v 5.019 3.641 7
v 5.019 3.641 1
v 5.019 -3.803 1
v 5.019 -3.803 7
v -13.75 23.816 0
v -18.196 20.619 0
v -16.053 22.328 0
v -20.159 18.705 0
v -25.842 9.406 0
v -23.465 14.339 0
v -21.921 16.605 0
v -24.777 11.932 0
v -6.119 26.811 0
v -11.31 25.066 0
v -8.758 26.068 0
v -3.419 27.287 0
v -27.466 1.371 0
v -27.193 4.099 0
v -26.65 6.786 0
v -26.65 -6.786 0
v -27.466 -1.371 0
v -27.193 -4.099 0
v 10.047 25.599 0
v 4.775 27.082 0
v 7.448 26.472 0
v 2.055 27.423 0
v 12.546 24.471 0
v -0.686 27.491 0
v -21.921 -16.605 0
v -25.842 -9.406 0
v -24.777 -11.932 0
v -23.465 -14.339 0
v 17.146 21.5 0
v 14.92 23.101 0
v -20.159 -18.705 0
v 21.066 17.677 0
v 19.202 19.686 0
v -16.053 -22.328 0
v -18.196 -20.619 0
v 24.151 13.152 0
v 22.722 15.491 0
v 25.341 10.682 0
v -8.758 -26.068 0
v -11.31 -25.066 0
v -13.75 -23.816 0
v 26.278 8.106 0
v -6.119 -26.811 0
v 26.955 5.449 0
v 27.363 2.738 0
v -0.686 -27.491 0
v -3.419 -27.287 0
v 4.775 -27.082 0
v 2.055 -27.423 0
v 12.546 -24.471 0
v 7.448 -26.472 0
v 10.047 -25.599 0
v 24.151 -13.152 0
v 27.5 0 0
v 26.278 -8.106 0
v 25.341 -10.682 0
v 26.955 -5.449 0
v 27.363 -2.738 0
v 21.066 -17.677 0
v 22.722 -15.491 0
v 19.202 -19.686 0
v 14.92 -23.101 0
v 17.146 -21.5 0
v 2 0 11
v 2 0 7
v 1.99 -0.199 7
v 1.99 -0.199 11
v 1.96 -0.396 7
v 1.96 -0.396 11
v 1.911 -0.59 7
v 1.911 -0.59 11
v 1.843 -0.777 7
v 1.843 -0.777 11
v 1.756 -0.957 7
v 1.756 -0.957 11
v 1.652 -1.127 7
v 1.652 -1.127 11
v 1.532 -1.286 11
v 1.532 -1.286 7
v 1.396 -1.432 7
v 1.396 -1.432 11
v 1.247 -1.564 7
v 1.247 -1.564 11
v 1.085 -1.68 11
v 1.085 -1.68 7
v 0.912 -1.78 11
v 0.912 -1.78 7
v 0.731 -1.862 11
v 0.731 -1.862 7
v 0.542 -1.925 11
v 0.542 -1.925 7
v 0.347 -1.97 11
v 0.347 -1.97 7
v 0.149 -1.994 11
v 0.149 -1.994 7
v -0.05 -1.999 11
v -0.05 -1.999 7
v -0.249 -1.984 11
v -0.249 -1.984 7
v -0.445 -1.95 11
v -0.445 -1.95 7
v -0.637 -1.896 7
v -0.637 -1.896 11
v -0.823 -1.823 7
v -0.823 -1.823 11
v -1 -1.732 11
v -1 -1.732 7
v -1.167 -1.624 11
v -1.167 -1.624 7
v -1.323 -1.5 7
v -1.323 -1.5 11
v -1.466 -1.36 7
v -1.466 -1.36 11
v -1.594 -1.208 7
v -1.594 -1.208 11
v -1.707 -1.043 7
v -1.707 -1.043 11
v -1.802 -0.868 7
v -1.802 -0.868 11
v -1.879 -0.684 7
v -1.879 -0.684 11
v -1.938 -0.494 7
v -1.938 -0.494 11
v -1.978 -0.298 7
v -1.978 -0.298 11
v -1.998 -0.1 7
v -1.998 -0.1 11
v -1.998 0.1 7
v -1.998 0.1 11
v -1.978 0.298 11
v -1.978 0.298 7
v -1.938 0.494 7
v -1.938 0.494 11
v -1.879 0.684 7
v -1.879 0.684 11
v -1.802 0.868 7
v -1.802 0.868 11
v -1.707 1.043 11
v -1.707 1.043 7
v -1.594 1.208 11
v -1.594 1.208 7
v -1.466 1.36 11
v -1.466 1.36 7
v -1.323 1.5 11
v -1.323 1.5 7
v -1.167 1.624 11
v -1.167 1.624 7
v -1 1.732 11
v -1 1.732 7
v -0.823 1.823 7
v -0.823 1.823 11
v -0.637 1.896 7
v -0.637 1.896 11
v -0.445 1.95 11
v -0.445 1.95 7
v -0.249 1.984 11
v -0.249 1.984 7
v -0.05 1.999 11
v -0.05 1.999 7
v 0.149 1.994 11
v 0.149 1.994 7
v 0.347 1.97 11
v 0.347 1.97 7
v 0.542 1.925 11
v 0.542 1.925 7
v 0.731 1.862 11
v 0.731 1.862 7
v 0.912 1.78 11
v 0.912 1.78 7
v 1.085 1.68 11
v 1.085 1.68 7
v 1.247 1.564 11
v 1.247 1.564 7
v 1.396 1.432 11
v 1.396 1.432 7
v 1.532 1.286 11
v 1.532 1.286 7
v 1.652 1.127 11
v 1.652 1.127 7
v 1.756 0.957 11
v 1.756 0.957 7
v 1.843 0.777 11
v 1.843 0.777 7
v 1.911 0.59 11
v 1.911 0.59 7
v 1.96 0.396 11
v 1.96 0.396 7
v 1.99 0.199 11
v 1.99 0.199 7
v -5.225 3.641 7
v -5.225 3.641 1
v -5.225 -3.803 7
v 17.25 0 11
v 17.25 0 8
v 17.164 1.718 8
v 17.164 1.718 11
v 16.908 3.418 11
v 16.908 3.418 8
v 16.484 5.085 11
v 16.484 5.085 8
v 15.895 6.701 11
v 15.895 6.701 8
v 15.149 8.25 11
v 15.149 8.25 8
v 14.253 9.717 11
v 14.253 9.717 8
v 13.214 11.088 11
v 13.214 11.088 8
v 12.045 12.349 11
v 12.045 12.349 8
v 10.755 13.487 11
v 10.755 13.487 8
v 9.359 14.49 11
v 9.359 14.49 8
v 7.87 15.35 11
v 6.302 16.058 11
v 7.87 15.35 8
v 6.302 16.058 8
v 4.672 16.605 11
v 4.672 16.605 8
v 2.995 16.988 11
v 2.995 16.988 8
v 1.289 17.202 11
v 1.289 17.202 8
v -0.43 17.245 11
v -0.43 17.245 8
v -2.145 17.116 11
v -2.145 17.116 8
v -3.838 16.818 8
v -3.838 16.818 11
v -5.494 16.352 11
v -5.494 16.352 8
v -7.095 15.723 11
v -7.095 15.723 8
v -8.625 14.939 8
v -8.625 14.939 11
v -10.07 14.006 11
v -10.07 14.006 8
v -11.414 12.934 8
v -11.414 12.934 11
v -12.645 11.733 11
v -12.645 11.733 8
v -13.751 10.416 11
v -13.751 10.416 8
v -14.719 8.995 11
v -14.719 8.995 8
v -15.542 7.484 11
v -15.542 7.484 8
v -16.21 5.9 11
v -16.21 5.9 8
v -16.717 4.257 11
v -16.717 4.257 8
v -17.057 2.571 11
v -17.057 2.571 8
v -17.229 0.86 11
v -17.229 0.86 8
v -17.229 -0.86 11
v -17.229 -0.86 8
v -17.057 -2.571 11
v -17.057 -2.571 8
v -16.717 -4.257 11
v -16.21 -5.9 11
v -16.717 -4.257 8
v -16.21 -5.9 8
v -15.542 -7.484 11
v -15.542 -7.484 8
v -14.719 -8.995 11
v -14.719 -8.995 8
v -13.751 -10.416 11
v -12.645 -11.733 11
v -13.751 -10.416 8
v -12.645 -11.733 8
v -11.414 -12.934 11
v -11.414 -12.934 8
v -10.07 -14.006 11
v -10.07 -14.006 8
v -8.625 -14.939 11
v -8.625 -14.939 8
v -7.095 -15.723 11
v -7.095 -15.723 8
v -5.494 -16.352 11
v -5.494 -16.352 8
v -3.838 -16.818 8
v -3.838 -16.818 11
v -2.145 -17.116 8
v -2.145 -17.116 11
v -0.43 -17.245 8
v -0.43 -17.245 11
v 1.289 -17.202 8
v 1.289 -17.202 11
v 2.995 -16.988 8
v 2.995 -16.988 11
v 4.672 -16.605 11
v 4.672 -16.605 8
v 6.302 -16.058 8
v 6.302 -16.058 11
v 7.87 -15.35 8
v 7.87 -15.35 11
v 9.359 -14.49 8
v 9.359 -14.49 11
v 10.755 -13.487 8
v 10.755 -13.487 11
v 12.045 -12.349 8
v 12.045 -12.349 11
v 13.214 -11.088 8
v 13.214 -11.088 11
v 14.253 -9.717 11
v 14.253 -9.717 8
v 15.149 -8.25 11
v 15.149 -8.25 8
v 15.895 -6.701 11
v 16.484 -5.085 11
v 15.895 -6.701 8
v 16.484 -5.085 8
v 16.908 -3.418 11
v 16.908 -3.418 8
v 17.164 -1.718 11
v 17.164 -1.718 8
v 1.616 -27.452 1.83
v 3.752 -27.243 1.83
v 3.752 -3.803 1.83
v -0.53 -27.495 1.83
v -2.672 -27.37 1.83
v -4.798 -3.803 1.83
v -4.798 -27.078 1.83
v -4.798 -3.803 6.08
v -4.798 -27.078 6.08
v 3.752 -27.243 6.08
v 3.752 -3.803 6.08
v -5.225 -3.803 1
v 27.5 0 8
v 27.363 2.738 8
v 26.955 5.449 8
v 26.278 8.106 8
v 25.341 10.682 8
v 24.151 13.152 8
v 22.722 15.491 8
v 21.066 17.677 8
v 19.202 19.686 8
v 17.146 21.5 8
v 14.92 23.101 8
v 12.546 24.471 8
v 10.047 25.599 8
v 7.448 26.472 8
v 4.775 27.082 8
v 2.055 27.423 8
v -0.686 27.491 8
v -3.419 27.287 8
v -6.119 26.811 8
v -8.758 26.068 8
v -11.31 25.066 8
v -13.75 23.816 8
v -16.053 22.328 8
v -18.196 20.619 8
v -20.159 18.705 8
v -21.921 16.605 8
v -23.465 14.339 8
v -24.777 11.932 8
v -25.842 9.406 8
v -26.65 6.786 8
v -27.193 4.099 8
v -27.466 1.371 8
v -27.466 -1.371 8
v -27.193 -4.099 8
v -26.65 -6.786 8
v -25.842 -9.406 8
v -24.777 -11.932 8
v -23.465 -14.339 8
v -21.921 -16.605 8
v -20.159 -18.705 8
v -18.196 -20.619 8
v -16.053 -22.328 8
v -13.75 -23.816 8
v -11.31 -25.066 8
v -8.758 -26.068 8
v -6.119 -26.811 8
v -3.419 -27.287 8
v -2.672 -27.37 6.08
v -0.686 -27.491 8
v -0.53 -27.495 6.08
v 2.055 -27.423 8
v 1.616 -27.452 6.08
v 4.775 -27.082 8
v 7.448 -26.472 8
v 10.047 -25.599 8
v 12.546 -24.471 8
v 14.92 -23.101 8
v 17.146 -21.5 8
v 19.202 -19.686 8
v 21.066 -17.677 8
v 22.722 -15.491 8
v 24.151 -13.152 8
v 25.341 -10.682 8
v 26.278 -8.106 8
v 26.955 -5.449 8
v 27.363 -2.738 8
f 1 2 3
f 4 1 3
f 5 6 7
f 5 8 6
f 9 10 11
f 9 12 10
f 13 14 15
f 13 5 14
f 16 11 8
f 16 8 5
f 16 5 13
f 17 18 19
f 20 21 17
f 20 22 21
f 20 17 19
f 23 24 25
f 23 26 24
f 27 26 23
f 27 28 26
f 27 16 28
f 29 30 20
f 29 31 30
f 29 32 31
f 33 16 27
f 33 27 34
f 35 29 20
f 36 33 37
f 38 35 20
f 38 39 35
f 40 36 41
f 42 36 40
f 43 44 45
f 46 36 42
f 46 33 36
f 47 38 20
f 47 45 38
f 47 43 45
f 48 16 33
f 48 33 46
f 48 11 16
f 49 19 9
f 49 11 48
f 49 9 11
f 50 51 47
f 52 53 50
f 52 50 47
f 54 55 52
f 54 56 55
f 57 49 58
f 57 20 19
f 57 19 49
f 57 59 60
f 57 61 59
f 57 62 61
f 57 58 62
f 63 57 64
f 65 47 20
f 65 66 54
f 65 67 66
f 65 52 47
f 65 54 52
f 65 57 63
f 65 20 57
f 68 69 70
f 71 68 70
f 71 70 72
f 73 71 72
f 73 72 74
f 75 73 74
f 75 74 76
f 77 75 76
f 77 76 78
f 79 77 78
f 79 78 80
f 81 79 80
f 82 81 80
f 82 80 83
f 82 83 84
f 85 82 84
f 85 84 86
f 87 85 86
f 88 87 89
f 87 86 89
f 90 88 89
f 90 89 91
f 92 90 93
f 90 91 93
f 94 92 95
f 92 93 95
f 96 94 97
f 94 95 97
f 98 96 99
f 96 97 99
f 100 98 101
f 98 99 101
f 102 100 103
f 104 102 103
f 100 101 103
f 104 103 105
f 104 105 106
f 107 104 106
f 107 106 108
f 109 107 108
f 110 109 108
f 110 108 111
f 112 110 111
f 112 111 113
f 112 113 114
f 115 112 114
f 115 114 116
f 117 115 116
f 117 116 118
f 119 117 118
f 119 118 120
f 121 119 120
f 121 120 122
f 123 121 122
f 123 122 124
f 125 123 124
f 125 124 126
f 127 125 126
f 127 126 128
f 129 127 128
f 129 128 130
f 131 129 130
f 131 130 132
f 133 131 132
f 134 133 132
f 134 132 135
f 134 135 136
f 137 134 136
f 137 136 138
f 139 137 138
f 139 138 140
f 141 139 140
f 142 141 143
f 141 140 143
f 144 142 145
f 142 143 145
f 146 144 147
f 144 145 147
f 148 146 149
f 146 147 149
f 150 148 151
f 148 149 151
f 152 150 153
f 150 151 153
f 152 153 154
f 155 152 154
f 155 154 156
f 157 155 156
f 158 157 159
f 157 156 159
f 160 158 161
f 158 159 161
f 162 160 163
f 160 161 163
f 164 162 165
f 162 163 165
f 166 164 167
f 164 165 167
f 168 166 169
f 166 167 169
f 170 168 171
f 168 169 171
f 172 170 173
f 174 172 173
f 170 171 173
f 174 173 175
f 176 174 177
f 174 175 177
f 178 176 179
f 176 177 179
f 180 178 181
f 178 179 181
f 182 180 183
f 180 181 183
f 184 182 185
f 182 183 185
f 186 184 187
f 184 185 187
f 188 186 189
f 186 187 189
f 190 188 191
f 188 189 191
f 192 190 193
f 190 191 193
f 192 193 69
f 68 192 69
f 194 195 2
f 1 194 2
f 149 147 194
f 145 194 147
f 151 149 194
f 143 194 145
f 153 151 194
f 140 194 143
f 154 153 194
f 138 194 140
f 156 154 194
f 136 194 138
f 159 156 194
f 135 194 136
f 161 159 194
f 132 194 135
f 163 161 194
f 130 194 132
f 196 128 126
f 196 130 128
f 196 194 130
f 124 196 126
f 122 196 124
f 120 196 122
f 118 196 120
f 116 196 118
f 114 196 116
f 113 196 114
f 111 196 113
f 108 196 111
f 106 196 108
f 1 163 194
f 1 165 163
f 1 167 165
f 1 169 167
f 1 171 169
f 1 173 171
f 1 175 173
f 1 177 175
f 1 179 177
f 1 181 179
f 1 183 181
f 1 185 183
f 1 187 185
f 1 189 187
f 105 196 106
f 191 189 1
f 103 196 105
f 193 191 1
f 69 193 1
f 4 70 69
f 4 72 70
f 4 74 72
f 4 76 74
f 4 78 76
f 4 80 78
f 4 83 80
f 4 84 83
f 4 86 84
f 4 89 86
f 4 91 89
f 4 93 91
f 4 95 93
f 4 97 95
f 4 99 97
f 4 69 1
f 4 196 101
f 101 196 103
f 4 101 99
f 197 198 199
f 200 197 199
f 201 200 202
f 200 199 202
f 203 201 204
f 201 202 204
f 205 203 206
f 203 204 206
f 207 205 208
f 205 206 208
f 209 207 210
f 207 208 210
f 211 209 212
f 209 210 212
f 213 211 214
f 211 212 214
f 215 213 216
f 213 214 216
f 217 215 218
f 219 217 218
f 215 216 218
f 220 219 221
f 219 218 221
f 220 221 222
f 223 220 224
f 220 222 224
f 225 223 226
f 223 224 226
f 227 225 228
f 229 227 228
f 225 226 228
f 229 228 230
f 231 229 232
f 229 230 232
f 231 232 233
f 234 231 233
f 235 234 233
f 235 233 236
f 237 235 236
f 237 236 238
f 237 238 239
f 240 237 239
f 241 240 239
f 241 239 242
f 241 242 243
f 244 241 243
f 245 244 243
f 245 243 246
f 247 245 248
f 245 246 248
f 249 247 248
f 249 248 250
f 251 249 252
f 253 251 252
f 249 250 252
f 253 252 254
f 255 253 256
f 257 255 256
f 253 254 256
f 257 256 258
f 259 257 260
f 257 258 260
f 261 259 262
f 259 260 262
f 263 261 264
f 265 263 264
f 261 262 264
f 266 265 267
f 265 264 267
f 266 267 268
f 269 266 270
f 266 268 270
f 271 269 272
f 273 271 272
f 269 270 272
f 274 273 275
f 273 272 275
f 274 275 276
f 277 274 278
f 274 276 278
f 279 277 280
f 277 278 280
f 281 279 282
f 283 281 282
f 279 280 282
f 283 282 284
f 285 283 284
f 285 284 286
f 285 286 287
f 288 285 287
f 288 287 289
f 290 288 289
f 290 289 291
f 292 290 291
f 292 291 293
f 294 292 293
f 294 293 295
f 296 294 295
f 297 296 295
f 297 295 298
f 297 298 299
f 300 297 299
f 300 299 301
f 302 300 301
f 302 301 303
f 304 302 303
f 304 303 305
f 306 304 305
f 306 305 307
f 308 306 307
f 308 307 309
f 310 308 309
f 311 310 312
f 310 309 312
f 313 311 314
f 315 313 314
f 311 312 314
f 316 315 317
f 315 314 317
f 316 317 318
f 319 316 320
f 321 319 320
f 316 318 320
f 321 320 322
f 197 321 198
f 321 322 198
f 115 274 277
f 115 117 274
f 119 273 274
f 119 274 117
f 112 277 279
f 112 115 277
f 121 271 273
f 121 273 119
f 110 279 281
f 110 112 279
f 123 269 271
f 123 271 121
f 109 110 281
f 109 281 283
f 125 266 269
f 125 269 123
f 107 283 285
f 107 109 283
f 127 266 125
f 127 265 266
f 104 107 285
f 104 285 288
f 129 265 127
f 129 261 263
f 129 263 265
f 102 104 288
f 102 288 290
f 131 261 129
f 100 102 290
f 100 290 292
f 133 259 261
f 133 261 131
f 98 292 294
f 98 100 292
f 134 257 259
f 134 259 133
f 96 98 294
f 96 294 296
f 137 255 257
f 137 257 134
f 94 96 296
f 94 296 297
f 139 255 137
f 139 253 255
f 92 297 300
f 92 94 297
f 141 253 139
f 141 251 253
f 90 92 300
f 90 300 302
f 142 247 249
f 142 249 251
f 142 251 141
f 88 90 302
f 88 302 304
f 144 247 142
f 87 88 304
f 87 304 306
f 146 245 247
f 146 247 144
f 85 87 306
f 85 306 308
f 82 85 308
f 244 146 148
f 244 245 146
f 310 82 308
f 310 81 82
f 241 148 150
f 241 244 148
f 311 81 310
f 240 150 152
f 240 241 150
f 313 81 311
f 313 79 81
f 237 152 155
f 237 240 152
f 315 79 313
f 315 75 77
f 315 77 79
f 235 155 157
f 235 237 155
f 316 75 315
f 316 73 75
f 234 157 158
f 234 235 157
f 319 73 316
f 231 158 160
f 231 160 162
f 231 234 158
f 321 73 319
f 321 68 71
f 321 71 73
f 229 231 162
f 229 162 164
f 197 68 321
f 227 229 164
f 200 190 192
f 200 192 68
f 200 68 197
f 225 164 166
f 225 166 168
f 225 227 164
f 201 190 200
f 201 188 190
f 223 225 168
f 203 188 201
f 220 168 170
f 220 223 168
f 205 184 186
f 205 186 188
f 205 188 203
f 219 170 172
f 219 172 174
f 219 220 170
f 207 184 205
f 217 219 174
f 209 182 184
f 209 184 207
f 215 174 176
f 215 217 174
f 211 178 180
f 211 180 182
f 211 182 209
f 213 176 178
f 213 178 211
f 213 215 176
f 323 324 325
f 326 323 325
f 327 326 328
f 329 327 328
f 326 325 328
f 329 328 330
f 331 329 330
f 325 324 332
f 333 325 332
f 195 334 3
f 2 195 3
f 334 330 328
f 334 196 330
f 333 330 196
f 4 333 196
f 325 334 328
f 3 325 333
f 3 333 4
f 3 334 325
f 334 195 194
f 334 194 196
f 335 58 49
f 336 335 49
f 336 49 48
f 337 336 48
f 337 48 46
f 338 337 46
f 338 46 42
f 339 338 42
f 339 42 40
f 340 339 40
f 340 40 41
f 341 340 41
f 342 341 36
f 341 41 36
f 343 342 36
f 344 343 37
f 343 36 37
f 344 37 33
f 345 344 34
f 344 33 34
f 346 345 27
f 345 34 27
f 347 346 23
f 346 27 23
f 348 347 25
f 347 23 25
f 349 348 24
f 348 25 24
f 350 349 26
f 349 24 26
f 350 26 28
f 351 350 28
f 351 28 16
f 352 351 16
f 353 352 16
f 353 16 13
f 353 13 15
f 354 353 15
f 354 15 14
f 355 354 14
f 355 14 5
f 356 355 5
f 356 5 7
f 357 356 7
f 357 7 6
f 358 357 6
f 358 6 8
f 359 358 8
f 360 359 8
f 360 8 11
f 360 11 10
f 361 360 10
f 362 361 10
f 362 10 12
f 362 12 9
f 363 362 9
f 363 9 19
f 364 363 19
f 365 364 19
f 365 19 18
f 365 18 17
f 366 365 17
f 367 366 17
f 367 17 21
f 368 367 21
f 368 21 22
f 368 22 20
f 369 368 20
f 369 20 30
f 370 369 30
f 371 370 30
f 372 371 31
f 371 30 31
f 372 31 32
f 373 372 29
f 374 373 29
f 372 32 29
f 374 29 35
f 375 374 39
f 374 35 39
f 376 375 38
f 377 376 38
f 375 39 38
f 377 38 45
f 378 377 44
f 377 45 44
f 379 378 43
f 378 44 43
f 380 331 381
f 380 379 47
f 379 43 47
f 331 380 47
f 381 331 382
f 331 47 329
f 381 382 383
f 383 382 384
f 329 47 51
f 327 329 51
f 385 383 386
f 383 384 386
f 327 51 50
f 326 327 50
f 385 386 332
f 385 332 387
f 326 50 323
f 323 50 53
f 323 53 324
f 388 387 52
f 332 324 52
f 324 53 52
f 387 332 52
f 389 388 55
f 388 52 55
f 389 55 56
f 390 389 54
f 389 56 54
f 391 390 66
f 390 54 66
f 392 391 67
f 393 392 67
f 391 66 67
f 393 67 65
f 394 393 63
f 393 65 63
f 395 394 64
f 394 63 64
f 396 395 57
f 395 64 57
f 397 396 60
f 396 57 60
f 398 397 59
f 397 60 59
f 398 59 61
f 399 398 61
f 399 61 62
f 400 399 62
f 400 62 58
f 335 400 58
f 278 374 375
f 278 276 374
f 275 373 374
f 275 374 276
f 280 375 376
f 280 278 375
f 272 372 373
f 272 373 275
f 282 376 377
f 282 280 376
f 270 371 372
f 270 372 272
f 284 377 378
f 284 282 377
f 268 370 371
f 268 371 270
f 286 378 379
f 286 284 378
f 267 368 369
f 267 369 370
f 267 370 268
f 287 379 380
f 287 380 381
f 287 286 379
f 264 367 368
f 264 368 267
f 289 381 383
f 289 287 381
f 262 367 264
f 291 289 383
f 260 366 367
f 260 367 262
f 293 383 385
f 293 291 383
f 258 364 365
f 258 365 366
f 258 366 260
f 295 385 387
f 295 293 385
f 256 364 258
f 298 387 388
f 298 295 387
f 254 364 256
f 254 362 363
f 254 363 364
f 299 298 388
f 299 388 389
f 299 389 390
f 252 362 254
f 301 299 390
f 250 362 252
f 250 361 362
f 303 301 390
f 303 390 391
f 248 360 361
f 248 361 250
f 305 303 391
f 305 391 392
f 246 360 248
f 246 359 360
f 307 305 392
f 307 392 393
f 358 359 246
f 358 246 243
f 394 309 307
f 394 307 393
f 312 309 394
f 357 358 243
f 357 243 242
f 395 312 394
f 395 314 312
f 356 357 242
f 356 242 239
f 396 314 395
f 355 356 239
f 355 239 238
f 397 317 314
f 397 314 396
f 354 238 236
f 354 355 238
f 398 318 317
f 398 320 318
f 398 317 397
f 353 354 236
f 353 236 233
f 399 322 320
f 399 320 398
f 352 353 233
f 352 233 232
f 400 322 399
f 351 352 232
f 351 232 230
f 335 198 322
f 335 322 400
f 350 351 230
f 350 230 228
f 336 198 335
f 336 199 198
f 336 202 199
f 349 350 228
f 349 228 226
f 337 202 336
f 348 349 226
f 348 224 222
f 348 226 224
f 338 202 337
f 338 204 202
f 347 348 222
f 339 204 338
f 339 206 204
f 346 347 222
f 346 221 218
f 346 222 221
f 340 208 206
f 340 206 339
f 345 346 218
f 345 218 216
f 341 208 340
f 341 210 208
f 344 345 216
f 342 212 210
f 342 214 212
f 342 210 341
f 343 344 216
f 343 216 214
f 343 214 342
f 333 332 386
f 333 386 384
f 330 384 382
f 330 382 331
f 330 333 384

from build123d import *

# Parameters (mm, degrees)
F0_R      = 27.5
F1_DEPTH  = 8
F2_R      = 17.25
F3_DEPTH  = 3
F4_W      = 10.243726
F4_H      = 7.44366
F5_DEPTH  = 7
F6_W      = 8.55
F6_H      = 4.25
F7_DEPTH  = 25
F8_R      = 2
F9_DEPTH  = 25
F10_W     = 10.243726
F10_H     = 7.44366
F11_DEPTH = 1


with BuildPart() as f1:
    # F0 (on Top) → F1 (new body)
    with BuildSketch(Plane.XY):
        Circle(F0_R)
    extrude(amount=F1_DEPTH)

    # F2 (on face) → F3 (join)
    with BuildSketch(Plane.XY.offset(8)):
        Circle(F2_R)
    extrude(amount=F3_DEPTH)

    # F4 (on face) → F5 (cut)
    with BuildSketch(Plane(origin=(0, 0, 0), x_dir=(1, 0, 0), z_dir=(0, 0, -1))):
        with Locations((-0.102693, 0.080894)):
            Rectangle(F4_W, F4_H)
    extrude(amount=-F5_DEPTH, mode=Mode.SUBTRACT)

    # F6 (on face) → F7 (cut)
    with BuildSketch(Plane(origin=(0, -3.802724, 0), x_dir=(-1, 0, 0), z_dir=(0, 1, 0))):
        with Locations((0.52315, 3.955042)):
            Rectangle(F6_W, F6_H)
    extrude(amount=-F7_DEPTH, mode=Mode.SUBTRACT)

    # F8 (on face) → F9 (cut)
    with BuildSketch(Plane(origin=(0, 0, 7), x_dir=(1, 0, 0), z_dir=(0, 0, -1))):
        Circle(F8_R)
    extrude(amount=-F9_DEPTH, mode=Mode.SUBTRACT)

    # F10 (on face) → F11 (join)
    with BuildSketch(Plane(origin=(0, 0, 0), x_dir=(1, 0, 0), z_dir=(0, 0, -1))):
        with Locations((-0.102693, 0.080894)):
            Rectangle(F10_W, F10_H)
    extrude(amount=-F11_DEPTH)


solid = f1.part
